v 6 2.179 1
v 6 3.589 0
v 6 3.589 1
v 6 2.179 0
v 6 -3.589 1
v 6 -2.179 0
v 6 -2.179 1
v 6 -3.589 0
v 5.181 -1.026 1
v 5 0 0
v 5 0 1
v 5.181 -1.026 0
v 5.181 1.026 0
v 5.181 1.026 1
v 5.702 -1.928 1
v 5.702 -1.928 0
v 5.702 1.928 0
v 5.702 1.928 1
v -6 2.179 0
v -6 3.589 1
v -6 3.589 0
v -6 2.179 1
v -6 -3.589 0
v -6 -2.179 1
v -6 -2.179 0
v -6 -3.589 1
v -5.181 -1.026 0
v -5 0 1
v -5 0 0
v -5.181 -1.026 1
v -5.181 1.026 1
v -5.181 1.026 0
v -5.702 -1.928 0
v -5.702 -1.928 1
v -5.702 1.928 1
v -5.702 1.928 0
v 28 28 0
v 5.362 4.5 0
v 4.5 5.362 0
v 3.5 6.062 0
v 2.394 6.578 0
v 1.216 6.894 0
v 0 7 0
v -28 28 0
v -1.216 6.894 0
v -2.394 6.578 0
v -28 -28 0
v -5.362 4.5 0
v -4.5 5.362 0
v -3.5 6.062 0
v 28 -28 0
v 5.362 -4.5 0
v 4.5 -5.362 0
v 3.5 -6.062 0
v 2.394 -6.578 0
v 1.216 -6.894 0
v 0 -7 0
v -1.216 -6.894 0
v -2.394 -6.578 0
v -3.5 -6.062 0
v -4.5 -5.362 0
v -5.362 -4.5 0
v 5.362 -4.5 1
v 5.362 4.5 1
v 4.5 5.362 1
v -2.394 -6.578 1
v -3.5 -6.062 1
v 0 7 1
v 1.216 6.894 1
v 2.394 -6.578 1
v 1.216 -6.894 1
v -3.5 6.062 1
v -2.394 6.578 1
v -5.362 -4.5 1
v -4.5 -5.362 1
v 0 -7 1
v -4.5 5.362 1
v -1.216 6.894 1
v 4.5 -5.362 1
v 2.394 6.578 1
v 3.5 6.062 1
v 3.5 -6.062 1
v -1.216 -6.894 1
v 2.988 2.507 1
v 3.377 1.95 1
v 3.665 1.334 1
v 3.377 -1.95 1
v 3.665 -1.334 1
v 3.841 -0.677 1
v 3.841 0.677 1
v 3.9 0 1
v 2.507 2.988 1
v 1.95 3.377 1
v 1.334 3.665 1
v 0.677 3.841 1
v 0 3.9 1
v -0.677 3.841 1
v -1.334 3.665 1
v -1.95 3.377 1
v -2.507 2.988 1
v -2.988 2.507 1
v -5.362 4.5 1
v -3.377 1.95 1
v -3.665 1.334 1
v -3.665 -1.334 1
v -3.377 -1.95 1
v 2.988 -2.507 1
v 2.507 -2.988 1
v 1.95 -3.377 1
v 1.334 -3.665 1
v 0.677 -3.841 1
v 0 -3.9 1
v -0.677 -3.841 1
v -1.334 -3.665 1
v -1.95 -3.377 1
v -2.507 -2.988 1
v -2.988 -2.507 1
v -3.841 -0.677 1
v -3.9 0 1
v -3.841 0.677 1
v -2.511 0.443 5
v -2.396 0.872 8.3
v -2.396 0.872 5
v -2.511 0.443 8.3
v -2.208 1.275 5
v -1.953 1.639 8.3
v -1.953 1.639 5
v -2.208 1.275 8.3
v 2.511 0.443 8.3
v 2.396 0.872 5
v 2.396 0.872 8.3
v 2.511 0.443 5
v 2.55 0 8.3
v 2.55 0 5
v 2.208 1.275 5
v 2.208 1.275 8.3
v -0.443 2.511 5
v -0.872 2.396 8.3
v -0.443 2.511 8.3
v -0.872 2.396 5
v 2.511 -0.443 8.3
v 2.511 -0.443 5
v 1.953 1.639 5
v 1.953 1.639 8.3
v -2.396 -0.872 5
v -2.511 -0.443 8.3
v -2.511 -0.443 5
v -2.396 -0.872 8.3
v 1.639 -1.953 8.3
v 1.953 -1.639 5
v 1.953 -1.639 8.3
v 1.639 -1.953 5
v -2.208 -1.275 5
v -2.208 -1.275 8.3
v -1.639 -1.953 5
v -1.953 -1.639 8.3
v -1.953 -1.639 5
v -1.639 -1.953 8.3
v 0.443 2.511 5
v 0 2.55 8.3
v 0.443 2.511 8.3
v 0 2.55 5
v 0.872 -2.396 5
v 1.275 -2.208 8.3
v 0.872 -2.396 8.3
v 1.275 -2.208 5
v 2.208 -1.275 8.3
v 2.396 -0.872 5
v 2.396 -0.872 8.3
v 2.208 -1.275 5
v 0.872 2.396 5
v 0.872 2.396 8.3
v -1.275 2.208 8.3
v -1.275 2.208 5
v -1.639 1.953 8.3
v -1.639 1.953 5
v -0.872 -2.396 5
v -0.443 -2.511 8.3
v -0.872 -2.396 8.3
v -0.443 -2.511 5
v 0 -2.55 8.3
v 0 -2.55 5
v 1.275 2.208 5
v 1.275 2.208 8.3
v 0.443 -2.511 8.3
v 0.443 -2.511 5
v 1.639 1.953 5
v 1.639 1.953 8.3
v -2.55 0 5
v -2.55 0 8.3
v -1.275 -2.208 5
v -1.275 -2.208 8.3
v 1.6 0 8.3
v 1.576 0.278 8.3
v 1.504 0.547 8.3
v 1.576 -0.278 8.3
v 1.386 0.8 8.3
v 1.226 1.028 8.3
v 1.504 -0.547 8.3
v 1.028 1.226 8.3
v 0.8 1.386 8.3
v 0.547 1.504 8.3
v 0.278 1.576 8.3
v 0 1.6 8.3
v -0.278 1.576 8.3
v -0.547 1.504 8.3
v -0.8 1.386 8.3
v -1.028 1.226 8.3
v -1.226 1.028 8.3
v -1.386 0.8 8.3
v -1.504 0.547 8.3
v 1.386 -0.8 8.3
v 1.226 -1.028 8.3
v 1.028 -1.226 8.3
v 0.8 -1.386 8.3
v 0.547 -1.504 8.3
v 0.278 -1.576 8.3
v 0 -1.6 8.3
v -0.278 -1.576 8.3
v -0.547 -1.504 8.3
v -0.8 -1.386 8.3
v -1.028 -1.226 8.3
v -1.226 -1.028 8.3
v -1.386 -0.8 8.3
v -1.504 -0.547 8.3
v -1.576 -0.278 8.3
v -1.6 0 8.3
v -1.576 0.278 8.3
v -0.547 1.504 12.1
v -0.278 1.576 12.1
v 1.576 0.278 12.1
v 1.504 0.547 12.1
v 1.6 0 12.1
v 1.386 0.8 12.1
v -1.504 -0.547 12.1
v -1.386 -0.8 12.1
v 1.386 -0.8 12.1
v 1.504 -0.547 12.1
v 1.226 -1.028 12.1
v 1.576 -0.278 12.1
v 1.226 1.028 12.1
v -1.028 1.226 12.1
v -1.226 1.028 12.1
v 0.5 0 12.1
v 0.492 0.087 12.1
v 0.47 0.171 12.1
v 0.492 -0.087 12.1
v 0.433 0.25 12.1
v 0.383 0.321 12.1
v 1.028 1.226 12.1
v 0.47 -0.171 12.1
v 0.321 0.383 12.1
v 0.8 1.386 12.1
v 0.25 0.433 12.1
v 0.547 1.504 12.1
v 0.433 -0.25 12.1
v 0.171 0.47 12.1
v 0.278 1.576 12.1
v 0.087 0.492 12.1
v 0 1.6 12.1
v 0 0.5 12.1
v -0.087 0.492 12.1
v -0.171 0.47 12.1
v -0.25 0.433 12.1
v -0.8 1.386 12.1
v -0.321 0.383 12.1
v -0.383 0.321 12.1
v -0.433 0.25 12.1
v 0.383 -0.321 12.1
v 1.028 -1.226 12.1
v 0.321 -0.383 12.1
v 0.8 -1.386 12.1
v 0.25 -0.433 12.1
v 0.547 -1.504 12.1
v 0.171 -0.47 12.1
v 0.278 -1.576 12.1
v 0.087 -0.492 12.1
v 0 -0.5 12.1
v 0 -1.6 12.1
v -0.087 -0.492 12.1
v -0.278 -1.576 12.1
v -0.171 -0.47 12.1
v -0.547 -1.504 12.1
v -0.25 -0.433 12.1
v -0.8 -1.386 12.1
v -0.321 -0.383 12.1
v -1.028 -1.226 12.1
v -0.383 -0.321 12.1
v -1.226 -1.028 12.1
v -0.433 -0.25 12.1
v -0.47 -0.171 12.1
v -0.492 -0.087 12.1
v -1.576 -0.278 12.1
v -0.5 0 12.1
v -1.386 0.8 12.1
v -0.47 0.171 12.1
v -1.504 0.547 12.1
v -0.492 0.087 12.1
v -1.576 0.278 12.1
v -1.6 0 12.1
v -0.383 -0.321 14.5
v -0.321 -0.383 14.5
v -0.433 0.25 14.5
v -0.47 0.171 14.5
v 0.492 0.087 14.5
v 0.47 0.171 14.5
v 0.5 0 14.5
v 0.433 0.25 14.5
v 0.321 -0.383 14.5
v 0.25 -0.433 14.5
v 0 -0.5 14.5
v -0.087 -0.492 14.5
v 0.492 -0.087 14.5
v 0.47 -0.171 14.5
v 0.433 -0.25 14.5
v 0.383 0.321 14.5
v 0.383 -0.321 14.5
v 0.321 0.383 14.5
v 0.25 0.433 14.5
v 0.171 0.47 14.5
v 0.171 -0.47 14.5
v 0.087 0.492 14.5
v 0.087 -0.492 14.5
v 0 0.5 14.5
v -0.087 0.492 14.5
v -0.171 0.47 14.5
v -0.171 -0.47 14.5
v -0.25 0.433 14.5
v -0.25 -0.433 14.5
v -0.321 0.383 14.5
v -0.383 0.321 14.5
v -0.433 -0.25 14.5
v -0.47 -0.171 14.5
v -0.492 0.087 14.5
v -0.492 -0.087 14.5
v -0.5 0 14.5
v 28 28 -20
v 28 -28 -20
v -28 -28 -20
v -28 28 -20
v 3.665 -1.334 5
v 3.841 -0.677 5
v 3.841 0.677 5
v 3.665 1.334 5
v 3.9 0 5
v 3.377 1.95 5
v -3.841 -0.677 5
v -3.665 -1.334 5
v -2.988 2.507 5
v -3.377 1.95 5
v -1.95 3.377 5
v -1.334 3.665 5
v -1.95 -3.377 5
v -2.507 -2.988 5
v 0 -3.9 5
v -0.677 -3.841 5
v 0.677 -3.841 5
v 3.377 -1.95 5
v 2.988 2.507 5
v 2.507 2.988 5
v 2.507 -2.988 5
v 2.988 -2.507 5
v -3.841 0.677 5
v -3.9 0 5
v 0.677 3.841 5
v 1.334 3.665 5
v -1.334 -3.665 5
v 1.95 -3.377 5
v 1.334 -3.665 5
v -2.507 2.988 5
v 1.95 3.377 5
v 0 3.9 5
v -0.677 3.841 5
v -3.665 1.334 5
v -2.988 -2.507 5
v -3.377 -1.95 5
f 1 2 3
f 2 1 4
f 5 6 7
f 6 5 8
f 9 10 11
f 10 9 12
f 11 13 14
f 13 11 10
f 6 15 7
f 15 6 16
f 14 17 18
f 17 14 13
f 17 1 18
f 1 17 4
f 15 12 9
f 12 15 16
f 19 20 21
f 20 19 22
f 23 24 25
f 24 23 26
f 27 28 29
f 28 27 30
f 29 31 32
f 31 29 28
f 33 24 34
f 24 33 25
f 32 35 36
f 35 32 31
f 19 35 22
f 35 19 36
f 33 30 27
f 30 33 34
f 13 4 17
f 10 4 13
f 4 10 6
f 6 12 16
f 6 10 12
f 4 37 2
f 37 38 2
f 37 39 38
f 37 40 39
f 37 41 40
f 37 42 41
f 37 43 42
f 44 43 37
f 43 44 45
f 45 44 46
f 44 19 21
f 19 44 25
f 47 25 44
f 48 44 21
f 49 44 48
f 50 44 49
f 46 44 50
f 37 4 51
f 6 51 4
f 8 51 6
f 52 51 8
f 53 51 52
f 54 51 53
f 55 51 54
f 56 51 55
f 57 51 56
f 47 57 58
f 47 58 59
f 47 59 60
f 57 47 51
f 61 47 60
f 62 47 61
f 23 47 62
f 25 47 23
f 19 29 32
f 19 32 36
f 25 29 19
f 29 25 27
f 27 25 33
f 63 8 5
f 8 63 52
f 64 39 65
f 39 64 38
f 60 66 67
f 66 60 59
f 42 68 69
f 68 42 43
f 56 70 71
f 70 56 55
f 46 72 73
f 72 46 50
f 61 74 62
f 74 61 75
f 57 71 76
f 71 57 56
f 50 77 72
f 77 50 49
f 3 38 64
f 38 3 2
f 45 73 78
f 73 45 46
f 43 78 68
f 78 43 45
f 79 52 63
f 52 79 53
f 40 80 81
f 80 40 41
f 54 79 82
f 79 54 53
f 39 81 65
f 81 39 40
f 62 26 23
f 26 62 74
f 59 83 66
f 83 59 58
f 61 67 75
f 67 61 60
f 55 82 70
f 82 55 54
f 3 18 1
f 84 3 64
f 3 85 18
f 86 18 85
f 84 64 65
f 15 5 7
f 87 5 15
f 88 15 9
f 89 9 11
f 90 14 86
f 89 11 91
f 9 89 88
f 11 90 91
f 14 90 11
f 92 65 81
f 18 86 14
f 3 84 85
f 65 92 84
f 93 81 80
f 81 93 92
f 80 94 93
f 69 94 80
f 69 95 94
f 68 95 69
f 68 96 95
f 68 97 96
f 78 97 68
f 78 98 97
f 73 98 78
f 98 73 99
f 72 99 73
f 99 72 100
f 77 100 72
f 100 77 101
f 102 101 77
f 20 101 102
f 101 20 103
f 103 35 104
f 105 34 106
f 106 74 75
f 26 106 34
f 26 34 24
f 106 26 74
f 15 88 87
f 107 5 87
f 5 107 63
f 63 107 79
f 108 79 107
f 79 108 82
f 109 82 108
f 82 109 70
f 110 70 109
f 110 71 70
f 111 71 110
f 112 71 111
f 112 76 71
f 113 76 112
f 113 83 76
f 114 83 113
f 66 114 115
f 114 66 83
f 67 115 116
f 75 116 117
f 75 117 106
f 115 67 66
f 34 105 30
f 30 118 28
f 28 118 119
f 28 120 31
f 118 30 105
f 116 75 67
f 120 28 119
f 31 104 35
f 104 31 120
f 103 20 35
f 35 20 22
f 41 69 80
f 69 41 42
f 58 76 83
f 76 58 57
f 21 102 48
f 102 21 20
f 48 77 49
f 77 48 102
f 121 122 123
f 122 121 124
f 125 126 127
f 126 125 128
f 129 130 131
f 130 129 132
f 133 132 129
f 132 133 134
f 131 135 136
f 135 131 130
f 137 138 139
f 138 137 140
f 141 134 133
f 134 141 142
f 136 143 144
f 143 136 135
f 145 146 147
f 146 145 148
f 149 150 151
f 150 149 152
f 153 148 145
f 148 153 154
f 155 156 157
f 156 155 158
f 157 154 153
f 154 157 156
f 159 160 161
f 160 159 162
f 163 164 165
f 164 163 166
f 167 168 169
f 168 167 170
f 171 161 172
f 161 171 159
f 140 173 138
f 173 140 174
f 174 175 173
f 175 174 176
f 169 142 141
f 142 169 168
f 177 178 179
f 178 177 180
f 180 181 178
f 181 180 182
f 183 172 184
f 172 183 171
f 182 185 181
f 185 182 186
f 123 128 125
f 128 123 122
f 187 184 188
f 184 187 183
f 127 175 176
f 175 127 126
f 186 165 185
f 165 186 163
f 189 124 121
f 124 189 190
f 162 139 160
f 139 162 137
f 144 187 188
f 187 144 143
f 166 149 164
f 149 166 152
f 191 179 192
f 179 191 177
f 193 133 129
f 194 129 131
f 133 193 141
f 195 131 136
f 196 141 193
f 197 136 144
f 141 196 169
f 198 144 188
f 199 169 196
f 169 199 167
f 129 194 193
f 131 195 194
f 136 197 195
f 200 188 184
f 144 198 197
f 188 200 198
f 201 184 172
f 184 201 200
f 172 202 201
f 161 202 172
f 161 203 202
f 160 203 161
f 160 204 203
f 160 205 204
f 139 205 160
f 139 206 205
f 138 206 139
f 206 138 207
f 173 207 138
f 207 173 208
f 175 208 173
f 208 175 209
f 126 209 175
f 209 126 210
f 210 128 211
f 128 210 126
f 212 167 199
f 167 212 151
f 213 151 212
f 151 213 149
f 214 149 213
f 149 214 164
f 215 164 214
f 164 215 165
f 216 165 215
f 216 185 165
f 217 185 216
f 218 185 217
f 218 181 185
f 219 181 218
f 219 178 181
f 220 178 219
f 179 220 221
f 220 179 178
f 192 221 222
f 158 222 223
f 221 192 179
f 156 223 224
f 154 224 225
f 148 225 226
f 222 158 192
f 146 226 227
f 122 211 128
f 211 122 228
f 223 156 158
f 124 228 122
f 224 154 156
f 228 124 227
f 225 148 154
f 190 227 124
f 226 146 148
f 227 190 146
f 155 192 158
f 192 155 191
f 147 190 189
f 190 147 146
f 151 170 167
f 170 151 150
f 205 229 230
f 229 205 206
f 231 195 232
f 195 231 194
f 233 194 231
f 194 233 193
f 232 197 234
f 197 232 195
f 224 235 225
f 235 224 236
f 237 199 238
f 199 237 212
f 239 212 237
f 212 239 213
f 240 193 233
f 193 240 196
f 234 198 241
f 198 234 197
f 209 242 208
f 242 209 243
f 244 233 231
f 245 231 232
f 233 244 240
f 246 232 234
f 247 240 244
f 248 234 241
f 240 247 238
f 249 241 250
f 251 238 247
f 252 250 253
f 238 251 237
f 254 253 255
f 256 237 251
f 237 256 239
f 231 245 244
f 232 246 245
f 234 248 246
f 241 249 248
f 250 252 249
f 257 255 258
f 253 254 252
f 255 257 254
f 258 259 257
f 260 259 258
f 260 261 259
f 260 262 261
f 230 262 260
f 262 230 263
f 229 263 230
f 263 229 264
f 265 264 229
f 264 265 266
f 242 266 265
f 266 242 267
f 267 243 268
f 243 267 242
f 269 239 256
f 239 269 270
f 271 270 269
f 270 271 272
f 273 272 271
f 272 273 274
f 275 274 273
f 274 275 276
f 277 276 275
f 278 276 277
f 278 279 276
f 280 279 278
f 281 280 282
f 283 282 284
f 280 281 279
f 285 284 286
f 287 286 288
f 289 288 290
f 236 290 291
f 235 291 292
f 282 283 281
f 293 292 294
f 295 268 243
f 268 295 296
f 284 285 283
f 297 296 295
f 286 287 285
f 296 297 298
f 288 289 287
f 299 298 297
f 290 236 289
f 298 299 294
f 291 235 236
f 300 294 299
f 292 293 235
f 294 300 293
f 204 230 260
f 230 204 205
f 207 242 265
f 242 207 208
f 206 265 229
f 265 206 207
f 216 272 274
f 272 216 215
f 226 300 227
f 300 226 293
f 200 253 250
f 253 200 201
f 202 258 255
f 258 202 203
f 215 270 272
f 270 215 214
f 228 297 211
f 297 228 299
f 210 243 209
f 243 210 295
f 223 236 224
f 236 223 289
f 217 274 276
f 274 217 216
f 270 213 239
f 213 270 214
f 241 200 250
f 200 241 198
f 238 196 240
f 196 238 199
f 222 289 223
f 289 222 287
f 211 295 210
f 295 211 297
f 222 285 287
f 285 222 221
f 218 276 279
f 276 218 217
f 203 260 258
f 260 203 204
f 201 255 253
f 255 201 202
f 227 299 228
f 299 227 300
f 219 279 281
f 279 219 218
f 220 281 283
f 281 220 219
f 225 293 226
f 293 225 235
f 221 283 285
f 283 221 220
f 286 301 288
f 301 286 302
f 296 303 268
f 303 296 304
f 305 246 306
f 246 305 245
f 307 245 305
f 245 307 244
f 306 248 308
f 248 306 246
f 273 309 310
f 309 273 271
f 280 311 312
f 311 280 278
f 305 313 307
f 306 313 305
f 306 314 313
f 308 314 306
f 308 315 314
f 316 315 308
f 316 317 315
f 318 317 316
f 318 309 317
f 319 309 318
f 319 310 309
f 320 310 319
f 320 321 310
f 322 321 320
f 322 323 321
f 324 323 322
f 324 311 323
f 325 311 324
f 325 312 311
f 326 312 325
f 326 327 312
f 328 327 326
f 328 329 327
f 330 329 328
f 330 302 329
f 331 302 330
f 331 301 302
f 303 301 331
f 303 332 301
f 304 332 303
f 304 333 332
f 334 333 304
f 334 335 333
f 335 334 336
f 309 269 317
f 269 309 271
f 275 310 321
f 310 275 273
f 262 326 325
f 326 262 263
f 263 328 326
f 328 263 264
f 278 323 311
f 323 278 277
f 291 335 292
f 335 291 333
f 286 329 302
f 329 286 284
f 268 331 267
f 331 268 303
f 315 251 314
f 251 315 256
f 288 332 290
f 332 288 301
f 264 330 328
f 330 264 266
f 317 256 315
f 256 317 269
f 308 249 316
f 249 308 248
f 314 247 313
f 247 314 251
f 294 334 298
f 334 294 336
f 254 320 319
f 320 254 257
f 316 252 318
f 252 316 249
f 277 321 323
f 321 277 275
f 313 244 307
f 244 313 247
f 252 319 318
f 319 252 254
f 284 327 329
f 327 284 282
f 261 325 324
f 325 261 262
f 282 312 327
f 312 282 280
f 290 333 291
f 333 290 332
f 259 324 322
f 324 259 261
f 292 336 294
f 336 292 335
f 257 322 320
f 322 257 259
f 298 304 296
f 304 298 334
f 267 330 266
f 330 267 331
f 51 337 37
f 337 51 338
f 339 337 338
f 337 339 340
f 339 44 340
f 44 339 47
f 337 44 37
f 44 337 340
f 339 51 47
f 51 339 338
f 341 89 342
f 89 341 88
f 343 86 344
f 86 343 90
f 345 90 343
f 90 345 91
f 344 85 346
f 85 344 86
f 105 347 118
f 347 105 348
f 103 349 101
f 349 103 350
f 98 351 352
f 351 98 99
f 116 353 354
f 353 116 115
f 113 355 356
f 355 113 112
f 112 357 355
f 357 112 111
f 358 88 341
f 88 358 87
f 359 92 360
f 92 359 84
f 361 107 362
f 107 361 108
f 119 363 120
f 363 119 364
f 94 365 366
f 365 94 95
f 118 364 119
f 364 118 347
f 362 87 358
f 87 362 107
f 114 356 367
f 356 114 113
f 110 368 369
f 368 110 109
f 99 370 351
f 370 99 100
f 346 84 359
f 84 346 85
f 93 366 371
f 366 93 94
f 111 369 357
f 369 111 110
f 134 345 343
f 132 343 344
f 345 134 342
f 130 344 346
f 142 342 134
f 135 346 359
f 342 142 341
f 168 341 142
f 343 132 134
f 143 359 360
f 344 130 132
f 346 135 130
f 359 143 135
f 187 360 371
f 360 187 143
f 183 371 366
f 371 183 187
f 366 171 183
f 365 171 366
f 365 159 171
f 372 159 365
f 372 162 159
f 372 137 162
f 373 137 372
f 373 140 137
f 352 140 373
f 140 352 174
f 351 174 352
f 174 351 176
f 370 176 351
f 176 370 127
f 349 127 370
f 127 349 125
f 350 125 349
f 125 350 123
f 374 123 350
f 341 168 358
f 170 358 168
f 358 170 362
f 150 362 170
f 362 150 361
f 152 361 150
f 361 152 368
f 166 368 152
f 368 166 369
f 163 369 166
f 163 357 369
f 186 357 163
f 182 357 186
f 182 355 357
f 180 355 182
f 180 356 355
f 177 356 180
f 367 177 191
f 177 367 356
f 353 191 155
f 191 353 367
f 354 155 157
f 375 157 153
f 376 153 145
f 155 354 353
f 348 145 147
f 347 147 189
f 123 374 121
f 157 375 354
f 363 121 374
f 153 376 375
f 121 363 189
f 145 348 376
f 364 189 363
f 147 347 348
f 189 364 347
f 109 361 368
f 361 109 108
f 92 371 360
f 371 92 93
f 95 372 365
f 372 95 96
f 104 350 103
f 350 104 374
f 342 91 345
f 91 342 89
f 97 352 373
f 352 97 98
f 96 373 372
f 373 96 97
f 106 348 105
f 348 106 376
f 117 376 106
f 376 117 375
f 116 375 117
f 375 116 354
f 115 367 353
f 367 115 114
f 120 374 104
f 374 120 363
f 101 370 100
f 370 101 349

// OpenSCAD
module clock_movement( time = [1, 39, 15], hand_style = "classic") {
    
    // box-shaped main body
    width = 56;
    depth = 56;
    height = 20;
    
    // alignment pattern
    alignment_dm = 14; // diameter of alignment pattern
    alignment_h = 1;    // height of alignment pattern
    alignment_flat = 1; // recess of falttening
    alignment_notch_dm = 6; // diameter of alignment notches
    alignment_notch_fl = 2; // recess of notch flattening
    
    // main body
    color("Gray")
    // method 1 as of in the book
    translate( [-width / 2, -depth / 2 , -height ] )
    cube( [width, depth, height] ); 
    // method 2
//    translate( [0, 0, -height/2] )
//   # cube( [width, depth, height], center = true ); 

    // screw terminal (measured from main body)
    screw_terminal_dm = 7.8;    // screw terminal diameter
    screw_terminal_h = 5;   // screw terminal height
    
    // clock hands axle
    hour_axle_dm = 5.1; // hour axle diameter
    hour_axle_h = 8.3;  // hour axle height
    
    minute_axle_dm = 3.2; // hour axle diameter
    minute_axle_h = 12.1;  // hour axle height
    
    second_axle_dm = 1; // hour axle diameter
    second_axle_h = 14.5;  // hour axle height
    
    // alignment pattern
     difference() {
        
        color("DarkBlue")
        cylinder( d = alignment_dm, h = alignment_h, $fn = 36);
        
        color("Gray")
        for ( i = [0:1] )
        mirror( [i, 0, 0] )
        union() {
            translate([ alignment_dm / 2 - alignment_flat, -(alignment_dm + 2) / 2, -1 ])
            cube([alignment_flat + 1, alignment_dm + 2, alignment_h + 2 ]);
            
            translate([ alignment_dm / 2 - alignment_notch_fl + alignment_notch_dm / 2, 0, -1 ])
            cylinder( d = alignment_notch_dm, h = alignment_h +2, $fn = 18);
        }
    }
    
    // screw terminal
    color("Gold")
    cylinder( d = screw_terminal_dm, h = screw_terminal_h, $fn = 36);
    
    // axles
    color("Black") {
        cylinder( d = hour_axle_dm, h = hour_axle_h, $fn = 36);
        cylinder( d = minute_axle_dm, h = minute_axle_h, $fn = 36);
        cylinder( d = second_axle_dm, h = second_axle_h, $fn = 36);
    }
    
    // clock hands
    rotate( [0, 0, -360 *  time[0] / 12] )
    translate( [0, 0, hour_axle_h - 1] )
    hour_hand();
    
    rotate( [0, 0, -360 * time[1] / 60] )
    translate( [0, 0, minute_axle_h - 1] )
    minute_hand();
    
    rotate( [0, 0, -360 * time[2] / 60] )
    translate( [0, 0, second_axle_h ] )
    second_hand();
    
    module hour_hand()  // German: stundenzeiger
    {
        
        h = 0.4;   // height
        l = 72.35; // length
        r = 67.6;  // radius
        b = 5;     // width
        dm = 9.5;  // diameter
        
        if (hand_style == "modern") {
            color("Black")
            union() {
                cylinder( d = dm, h = h, $fn = 36);
                
                translate( [ -b / 2,  0, 0 ] )
                    cube ( [ b, r, h] );
                }
            }
            
        if (hand_style == "deco") {
            color("black")
            linear_extrude( height = h )
            import("hour.svg");
            }
        
        if (hand_style == "classic") {
            lc = 61;
            color("black")
            png_hands( "hour.png", lc, h, [-9.5, -6.75, 0]);
            }
            
        }
    
    module minute_hand()    // German: minute hand
        {
        
        h  = 0.4;   // height
        l  = 100.5; // length
        r  = 96;    // radius
        b  = 4;     // width
        dm = 9;     // diameter
        
        if (hand_style == "modern") {
            color("Black")
            union() {
                cylinder( d = dm, h = h, $fn = 36 );
                
                translate( [-b / 2, 0, 0] )
                cube( [b, r, h] );
            }
        }
        
        if (hand_style == "deco") {
            color("black")
            linear_extrude( height = h )
            import("minute.svg");
            }
            
        if (hand_style == "classic") {
            lc = 84;

            color("Black")
            png_hands("minute.png", lc, h, [-9, -6.75, 0]);
        }
    }
    
    module second_hand()    // German: sekundenzeiger
    {
        
        b1  = 1.25; // width front part
        l1  = 95;   // length front part
        b2  = 1.25; // width neck
        l2  = 15;   // length neck
        b3  = 4.6;  // width back part
        l3  = 24;   // length back part
        dm  = 7.1;  // diameter
        h   = 0.4;  // material thickness
        
        if (hand_style == "modern") {
            color("Red")
            union() {
                cylinder( d = dm, h = h, $fn = 36);
                
                translate( [-b1 / 2, 0, 0] )
                cube( [b1, l1, h] );
                
                translate( [-b2 / 2, -l2, 0] )
                cube( [b2, l2, h] );

                translate( [-b3 / 2, -(l2 + l3), 0] )
                cube( [b3, l3, h] );
            }
        }
        
        if (hand_style == "deco") {
            color("red")        // project file is still "black"
            linear_extrude( height = h )
            import("second.svg");
            }
        
        if (hand_style == "classic") {
            lc = 123;

            color("Black")
            png_hands("second.png", lc, h, [-4,-36.8,0] );
        }
       
        }
        
        module png_hands(filename, length, height, displacement) {
            translate( displacement )
            linear_extrude( height = height )
            resize( [0, length], auto = true )
            projection( cut = true )
            translate( [0, 0, 75])
            surface( filename, invert=true);
            }
    
    }
    
clock_movement();
